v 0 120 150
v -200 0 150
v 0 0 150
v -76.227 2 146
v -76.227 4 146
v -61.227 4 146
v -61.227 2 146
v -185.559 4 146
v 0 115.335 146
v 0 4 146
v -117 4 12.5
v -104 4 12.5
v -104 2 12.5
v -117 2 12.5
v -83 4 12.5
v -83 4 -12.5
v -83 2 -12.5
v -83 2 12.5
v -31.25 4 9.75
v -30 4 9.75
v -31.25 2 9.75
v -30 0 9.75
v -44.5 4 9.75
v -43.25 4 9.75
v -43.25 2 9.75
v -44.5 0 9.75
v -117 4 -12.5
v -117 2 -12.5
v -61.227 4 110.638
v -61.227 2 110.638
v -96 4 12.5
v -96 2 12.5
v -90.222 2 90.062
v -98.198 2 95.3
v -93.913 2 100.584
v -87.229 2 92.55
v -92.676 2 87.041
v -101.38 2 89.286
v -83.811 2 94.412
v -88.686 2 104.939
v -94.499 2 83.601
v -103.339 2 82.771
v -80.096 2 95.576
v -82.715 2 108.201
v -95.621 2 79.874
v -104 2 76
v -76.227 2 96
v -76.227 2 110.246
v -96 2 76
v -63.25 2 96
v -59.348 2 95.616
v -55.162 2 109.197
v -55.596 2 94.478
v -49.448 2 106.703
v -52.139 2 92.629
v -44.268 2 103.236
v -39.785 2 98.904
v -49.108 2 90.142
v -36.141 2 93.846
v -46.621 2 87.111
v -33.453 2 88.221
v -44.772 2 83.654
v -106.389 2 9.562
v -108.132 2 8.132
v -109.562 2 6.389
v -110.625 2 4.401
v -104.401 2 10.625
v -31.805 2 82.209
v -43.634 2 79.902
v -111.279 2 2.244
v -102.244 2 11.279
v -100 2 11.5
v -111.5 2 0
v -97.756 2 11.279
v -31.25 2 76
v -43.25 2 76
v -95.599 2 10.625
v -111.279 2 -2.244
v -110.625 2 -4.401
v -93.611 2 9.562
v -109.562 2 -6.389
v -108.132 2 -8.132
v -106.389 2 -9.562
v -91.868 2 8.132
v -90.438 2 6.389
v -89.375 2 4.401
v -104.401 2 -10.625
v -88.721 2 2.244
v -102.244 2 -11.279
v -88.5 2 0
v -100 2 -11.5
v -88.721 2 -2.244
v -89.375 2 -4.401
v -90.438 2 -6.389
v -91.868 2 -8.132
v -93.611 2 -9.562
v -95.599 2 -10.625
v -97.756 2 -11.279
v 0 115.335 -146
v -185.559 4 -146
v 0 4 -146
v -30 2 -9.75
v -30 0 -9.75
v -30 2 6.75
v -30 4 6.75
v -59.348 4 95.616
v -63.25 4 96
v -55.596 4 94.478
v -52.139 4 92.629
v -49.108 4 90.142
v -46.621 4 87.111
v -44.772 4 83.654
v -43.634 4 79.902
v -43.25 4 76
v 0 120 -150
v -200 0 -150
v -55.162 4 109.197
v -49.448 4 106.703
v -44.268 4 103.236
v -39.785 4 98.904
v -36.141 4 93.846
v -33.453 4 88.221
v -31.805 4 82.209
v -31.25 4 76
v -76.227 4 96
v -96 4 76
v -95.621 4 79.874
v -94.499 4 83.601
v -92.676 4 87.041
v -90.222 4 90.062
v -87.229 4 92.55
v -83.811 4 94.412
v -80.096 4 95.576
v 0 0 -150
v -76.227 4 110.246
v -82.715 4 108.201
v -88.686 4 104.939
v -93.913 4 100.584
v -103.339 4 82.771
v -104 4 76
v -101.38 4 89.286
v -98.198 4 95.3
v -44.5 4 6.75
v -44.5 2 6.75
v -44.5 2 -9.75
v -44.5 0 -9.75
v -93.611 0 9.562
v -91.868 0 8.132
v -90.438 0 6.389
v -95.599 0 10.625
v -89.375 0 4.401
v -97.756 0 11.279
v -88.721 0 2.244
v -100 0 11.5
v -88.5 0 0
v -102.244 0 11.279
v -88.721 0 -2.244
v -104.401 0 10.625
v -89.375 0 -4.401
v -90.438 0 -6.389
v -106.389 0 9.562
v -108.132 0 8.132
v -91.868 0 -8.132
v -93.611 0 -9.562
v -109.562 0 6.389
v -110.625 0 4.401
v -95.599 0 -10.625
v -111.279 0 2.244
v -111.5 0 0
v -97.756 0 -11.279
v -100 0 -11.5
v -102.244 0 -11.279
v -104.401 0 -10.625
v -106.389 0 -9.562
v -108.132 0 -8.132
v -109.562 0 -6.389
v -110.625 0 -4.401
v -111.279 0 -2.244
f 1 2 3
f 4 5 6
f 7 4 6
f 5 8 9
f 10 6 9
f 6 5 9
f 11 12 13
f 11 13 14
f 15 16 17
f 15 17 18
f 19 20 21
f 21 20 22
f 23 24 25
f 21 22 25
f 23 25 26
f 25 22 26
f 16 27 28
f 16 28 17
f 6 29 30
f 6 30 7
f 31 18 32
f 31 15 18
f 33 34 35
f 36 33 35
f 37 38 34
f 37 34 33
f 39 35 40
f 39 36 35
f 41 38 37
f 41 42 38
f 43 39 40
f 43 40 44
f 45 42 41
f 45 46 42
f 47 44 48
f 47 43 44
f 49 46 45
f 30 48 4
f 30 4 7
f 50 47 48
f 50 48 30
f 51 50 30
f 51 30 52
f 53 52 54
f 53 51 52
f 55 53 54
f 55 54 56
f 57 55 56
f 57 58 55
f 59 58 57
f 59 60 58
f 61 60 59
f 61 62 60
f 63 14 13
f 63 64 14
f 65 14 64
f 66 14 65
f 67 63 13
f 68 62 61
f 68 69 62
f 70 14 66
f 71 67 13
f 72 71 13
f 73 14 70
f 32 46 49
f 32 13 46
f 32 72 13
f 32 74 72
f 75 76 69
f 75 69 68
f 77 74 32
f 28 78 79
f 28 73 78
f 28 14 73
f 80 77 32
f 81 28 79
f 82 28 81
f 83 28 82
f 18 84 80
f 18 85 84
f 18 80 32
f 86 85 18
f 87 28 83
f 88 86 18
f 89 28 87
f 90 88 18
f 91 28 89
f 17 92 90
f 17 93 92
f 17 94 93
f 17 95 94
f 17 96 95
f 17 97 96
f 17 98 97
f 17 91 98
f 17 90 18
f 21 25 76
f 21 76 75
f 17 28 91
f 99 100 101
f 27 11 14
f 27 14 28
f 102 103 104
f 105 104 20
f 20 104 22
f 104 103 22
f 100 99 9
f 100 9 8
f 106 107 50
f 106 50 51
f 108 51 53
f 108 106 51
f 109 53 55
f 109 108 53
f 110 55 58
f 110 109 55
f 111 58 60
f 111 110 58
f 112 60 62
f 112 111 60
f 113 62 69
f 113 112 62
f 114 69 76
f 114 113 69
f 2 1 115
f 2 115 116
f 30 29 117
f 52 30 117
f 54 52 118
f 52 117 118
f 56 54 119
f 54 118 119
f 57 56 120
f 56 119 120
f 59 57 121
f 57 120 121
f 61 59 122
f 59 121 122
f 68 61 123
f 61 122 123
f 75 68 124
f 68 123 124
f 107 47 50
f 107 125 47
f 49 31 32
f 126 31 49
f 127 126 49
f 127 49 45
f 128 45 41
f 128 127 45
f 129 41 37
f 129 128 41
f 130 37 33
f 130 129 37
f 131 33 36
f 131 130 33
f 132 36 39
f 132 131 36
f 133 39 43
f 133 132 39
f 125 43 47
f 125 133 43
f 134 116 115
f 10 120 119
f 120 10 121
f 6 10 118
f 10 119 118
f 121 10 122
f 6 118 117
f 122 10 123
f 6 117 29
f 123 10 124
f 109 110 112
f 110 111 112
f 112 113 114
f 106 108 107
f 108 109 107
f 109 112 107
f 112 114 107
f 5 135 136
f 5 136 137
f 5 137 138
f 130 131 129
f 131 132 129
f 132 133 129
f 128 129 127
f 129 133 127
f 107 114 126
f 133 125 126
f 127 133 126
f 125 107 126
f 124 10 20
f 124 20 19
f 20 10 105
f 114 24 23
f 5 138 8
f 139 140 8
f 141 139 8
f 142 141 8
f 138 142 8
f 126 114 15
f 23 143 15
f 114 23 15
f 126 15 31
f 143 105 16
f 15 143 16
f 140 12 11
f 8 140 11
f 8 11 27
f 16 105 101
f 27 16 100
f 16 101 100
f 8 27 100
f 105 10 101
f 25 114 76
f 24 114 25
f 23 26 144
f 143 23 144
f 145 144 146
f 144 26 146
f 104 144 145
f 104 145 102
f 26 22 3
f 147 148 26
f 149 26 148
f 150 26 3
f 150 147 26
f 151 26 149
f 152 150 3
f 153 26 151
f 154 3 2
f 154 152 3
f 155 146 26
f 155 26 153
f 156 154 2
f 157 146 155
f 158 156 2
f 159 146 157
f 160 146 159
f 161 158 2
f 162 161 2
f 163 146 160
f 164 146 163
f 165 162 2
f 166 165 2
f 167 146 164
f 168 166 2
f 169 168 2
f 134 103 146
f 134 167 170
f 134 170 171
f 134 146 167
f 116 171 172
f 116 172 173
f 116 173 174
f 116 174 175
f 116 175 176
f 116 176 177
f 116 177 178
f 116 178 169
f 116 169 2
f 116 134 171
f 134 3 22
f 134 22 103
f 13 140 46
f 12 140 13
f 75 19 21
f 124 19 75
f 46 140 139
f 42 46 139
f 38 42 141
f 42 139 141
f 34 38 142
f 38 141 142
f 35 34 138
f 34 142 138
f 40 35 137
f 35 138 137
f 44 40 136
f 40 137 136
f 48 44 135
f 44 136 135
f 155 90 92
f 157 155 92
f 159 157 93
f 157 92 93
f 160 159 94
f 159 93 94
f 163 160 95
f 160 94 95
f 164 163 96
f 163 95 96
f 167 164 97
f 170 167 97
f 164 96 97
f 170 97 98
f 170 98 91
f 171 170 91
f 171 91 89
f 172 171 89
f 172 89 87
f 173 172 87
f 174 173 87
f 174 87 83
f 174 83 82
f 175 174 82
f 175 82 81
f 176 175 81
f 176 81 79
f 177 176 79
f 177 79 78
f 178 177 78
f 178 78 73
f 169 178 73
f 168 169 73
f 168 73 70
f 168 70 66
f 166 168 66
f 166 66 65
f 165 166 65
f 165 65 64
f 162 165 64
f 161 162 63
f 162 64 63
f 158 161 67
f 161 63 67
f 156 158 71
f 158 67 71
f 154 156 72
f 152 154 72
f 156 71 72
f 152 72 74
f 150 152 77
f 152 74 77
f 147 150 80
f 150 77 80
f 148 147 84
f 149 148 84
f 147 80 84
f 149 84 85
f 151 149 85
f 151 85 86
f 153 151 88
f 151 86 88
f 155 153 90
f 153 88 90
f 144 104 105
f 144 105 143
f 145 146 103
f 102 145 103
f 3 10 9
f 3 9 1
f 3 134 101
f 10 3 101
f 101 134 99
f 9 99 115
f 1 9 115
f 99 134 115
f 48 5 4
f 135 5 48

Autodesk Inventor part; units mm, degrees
ref_plane "YZ Plane" through (0, 0, 0) normal (1, 0, 0) x (0, 1, 0)
ref_plane "XZ Plane" through (0, 0, 0) normal (0, 1, 0) x (-1, 0, 0)
ref_plane "XY Plane" through (0, 0, 0) normal (0, 0, 1) x (1, 0, 0)
sketch "Szkic1" plane through (0, 0, 0) normal (0, 0, 1) x (1, 0, 0)
  line L0 (0, 0) -> (-200, 0)
  line L1 (0, 0) -> (0, 120)
  line L2 (0, 120) -> (-200, 0)
  dimension "d0" = 200
  dimension "d1" = 120
extrude "Wyciągnięcie proste1" add sketch "Szkic1" along normal mid plane 300
shell "Skorupa1" thickness 4 removed faces 1 at (0, 40, -50)
sketch "Szkic2" plane through (-185.5587, 4, -146) normal (0, 1, 0) x (1, 0, 0)
  line L0 (68.5587, -133.5) -> (102.5587, -133.5)
  line L1 (102.5587, -133.5) -> (102.5587, -158.5)
  line L2 (102.5587, -158.5) -> (68.5587, -158.5)
  line L3 (68.5587, -158.5) -> (68.5587, -133.5)
  line L4 (185.5587, 4) -> (-14.4413, 4) projected
  line L5 (185.5587, 4) -> (185.5587, -296) projected
  circle A0 centre (85.5587, -146) radius 11.5
  point P0 (185.5587, -146)
  dimension "d5" = 34
  dimension "d6" = 25
  dimension "d7" = 137.5
  dimension "d8" = 83
  dimension "d9" = 23
  dimension "d10" = 100
  dimension "d11" = 150
extrude "Wyciągnięcie proste2" cut sketch "Szkic2" against normal through all contours A0
extrude "Wyciągnięcie proste3" cut sketch "Szkic2" against normal blind 2
sketch "Szkic3" plane through (-200, 0, 150) normal (0, -1, 0) x (1, 0, 0)
  circle A0 centre (100, -150) radius 11.5 projected
  line L0 (200, -300) -> (200, 0) projected
  line L1 (0, 0) -> (200, 0) projected
  line L2 (0, 0) -> (0, -300) projected
  line L3 (200, -300) -> (0, -300) projected
  line L4 (155.5, -159.75) -> (170, -159.75)
  line L5 (170, -159.75) -> (170, -140.25)
  line L6 (170, -140.25) -> (155.5, -140.25)
  line L7 (155.5, -140.25) -> (155.5, -159.75)
  line L8 (155.5, -159.75) -> (170, -140.25) construction
  line L9 (170, -159.75) -> (155.5, -140.25) construction
  line L10 (170, -143.25) -> (155.5, -143.25)
  point P0 (200, -150)
  point P1 (162.75, -150)
  dimension "d16" = 14.5
  dimension "d17" = 19.5
  dimension "d18" = 140.25
  dimension "d19" = 30
  dimension "d20" = 3
extrude "Wyciągnięcie proste4" cut sketch "Szkic3" against normal blind 2 contours L7 L10 L5 L4
extrude "Wyciągnięcie proste5" cut sketch "Szkic3" against normal blind 4 contours L7 L6 L5 L10
sketch "Szkic4" plane through (-185.5587, 4, -146) normal (0, 1, 0) x (1, 0, 0)
  line L0 (141.0587, -152.75) -> (155.5587, -152.75) projected
  line L1 (155.5587, -152.75) -> (155.5587, -155.75) projected
  line L2 (155.5587, -155.75) -> (141.0587, -155.75) projected
  line L3 (141.0587, -155.75) -> (141.0587, -152.75) projected
  line L4 (102.5587, -133.5) -> (102.5587, -158.5) projected
  line L5 (102.5587, -158.5) -> (68.5587, -158.5) projected
  line L6 (68.5587, -158.5) -> (68.5587, -133.5) projected
  line L7 (68.5587, -133.5) -> (102.5587, -133.5) projected
  line L8 (185.5587, 0) -> (185.5587, -292) projected
  line L9 (185.5587, 0) -> (0, 0) projected
  line L10 (0, -292) -> (0, 0) projected
  line L11 (0, -292) -> (185.5587, -292) projected
  line L12 (81.5587, -158.5) -> (89.5587, -158.5)
  line L13 (89.5587, -158.5) -> (89.5587, -222)
  line L14 (89.5587, -292) -> (81.5587, -292)
  line L15 (81.5587, -222) -> (81.5587, -158.5)
  line L16 (141.0587, -155.75) -> (155.5587, -155.75)
  line L17 (155.5587, -292) -> (141.0587, -292)
  line L18 (142.3087, -155.75) -> (154.3087, -155.75)
  line L19 (154.3087, -155.75) -> (154.3087, -222)
  line L20 (154.3087, -292) -> (142.3087, -292)
  line L21 (142.3087, -222) -> (142.3087, -155.75)
  line L22 (109.3319, -242) -> (124.3319, -242)
  line L23 (124.3319, -242) -> (124.3319, -292)
  line L24 (124.3319, -292) -> (109.3319, -292)
  line L25 (109.3319, -292) -> (109.3319, -242)
  line L26 (109.3319, -242) -> (109.5587, -242)
  line L27 (124.3319, -242) -> (122.3087, -242)
  line L28 (109.3319, -257) -> (116.5587, -257)
  line L29 (124.3319, -257) -> (119.3087, -257)
  arc A0 (89.5587, -222) -> (109.5587, -242) centre (109.5587, -222) ccw
  arc A1 (81.5587, -222) -> (116.5587, -257) centre (116.5587, -222) ccw
  arc A2 (122.3087, -242) -> (142.3087, -222) centre (122.3087, -222) ccw
  arc A3 (119.3087, -257) -> (154.3087, -222) centre (119.3087, -222) ccw
  line L30 (124.3319, -257) -> (124.3319, -256.6377)
  point P0 (185.5587, -146)
  point P1 (124.3319, -267)
  point P2 (116.8319, -292)
  point P3 (142.3087, -242)
  point P4 (89.5587, -257)
  point P5 (142.3087, -257)
  point P6 (109.3319, -256.2458)
  dimension "d25" = 96
  dimension "d26" = 8
  dimension "d28" = 31.25
  dimension "d29" = 12
  dimension "d33" = 15
  dimension "d34" = 61.2269
  dimension "d36" = 50
  dimension "d37" = 30
  dimension "d38" = 30
  dimension "d39" = 44.5
  dimension "d40" = 35
  dimension "d41" = 20
  dimension "d42" = 35
  dimension "d43" = 20
  dimension "d44" = 35
extrude "Wyciągnięcie proste6" cut sketch "Szkic4" against normal blind 2 contours L2 L19 A3 L23 L22 A2 L21 | L22 L23 A3 L29 L11 L25 L28 A1 | L23 L29 A3 | L25 A1 L15 L5 L13 A0 | A1 L28 L25
properties part number "PitchedRoof"
